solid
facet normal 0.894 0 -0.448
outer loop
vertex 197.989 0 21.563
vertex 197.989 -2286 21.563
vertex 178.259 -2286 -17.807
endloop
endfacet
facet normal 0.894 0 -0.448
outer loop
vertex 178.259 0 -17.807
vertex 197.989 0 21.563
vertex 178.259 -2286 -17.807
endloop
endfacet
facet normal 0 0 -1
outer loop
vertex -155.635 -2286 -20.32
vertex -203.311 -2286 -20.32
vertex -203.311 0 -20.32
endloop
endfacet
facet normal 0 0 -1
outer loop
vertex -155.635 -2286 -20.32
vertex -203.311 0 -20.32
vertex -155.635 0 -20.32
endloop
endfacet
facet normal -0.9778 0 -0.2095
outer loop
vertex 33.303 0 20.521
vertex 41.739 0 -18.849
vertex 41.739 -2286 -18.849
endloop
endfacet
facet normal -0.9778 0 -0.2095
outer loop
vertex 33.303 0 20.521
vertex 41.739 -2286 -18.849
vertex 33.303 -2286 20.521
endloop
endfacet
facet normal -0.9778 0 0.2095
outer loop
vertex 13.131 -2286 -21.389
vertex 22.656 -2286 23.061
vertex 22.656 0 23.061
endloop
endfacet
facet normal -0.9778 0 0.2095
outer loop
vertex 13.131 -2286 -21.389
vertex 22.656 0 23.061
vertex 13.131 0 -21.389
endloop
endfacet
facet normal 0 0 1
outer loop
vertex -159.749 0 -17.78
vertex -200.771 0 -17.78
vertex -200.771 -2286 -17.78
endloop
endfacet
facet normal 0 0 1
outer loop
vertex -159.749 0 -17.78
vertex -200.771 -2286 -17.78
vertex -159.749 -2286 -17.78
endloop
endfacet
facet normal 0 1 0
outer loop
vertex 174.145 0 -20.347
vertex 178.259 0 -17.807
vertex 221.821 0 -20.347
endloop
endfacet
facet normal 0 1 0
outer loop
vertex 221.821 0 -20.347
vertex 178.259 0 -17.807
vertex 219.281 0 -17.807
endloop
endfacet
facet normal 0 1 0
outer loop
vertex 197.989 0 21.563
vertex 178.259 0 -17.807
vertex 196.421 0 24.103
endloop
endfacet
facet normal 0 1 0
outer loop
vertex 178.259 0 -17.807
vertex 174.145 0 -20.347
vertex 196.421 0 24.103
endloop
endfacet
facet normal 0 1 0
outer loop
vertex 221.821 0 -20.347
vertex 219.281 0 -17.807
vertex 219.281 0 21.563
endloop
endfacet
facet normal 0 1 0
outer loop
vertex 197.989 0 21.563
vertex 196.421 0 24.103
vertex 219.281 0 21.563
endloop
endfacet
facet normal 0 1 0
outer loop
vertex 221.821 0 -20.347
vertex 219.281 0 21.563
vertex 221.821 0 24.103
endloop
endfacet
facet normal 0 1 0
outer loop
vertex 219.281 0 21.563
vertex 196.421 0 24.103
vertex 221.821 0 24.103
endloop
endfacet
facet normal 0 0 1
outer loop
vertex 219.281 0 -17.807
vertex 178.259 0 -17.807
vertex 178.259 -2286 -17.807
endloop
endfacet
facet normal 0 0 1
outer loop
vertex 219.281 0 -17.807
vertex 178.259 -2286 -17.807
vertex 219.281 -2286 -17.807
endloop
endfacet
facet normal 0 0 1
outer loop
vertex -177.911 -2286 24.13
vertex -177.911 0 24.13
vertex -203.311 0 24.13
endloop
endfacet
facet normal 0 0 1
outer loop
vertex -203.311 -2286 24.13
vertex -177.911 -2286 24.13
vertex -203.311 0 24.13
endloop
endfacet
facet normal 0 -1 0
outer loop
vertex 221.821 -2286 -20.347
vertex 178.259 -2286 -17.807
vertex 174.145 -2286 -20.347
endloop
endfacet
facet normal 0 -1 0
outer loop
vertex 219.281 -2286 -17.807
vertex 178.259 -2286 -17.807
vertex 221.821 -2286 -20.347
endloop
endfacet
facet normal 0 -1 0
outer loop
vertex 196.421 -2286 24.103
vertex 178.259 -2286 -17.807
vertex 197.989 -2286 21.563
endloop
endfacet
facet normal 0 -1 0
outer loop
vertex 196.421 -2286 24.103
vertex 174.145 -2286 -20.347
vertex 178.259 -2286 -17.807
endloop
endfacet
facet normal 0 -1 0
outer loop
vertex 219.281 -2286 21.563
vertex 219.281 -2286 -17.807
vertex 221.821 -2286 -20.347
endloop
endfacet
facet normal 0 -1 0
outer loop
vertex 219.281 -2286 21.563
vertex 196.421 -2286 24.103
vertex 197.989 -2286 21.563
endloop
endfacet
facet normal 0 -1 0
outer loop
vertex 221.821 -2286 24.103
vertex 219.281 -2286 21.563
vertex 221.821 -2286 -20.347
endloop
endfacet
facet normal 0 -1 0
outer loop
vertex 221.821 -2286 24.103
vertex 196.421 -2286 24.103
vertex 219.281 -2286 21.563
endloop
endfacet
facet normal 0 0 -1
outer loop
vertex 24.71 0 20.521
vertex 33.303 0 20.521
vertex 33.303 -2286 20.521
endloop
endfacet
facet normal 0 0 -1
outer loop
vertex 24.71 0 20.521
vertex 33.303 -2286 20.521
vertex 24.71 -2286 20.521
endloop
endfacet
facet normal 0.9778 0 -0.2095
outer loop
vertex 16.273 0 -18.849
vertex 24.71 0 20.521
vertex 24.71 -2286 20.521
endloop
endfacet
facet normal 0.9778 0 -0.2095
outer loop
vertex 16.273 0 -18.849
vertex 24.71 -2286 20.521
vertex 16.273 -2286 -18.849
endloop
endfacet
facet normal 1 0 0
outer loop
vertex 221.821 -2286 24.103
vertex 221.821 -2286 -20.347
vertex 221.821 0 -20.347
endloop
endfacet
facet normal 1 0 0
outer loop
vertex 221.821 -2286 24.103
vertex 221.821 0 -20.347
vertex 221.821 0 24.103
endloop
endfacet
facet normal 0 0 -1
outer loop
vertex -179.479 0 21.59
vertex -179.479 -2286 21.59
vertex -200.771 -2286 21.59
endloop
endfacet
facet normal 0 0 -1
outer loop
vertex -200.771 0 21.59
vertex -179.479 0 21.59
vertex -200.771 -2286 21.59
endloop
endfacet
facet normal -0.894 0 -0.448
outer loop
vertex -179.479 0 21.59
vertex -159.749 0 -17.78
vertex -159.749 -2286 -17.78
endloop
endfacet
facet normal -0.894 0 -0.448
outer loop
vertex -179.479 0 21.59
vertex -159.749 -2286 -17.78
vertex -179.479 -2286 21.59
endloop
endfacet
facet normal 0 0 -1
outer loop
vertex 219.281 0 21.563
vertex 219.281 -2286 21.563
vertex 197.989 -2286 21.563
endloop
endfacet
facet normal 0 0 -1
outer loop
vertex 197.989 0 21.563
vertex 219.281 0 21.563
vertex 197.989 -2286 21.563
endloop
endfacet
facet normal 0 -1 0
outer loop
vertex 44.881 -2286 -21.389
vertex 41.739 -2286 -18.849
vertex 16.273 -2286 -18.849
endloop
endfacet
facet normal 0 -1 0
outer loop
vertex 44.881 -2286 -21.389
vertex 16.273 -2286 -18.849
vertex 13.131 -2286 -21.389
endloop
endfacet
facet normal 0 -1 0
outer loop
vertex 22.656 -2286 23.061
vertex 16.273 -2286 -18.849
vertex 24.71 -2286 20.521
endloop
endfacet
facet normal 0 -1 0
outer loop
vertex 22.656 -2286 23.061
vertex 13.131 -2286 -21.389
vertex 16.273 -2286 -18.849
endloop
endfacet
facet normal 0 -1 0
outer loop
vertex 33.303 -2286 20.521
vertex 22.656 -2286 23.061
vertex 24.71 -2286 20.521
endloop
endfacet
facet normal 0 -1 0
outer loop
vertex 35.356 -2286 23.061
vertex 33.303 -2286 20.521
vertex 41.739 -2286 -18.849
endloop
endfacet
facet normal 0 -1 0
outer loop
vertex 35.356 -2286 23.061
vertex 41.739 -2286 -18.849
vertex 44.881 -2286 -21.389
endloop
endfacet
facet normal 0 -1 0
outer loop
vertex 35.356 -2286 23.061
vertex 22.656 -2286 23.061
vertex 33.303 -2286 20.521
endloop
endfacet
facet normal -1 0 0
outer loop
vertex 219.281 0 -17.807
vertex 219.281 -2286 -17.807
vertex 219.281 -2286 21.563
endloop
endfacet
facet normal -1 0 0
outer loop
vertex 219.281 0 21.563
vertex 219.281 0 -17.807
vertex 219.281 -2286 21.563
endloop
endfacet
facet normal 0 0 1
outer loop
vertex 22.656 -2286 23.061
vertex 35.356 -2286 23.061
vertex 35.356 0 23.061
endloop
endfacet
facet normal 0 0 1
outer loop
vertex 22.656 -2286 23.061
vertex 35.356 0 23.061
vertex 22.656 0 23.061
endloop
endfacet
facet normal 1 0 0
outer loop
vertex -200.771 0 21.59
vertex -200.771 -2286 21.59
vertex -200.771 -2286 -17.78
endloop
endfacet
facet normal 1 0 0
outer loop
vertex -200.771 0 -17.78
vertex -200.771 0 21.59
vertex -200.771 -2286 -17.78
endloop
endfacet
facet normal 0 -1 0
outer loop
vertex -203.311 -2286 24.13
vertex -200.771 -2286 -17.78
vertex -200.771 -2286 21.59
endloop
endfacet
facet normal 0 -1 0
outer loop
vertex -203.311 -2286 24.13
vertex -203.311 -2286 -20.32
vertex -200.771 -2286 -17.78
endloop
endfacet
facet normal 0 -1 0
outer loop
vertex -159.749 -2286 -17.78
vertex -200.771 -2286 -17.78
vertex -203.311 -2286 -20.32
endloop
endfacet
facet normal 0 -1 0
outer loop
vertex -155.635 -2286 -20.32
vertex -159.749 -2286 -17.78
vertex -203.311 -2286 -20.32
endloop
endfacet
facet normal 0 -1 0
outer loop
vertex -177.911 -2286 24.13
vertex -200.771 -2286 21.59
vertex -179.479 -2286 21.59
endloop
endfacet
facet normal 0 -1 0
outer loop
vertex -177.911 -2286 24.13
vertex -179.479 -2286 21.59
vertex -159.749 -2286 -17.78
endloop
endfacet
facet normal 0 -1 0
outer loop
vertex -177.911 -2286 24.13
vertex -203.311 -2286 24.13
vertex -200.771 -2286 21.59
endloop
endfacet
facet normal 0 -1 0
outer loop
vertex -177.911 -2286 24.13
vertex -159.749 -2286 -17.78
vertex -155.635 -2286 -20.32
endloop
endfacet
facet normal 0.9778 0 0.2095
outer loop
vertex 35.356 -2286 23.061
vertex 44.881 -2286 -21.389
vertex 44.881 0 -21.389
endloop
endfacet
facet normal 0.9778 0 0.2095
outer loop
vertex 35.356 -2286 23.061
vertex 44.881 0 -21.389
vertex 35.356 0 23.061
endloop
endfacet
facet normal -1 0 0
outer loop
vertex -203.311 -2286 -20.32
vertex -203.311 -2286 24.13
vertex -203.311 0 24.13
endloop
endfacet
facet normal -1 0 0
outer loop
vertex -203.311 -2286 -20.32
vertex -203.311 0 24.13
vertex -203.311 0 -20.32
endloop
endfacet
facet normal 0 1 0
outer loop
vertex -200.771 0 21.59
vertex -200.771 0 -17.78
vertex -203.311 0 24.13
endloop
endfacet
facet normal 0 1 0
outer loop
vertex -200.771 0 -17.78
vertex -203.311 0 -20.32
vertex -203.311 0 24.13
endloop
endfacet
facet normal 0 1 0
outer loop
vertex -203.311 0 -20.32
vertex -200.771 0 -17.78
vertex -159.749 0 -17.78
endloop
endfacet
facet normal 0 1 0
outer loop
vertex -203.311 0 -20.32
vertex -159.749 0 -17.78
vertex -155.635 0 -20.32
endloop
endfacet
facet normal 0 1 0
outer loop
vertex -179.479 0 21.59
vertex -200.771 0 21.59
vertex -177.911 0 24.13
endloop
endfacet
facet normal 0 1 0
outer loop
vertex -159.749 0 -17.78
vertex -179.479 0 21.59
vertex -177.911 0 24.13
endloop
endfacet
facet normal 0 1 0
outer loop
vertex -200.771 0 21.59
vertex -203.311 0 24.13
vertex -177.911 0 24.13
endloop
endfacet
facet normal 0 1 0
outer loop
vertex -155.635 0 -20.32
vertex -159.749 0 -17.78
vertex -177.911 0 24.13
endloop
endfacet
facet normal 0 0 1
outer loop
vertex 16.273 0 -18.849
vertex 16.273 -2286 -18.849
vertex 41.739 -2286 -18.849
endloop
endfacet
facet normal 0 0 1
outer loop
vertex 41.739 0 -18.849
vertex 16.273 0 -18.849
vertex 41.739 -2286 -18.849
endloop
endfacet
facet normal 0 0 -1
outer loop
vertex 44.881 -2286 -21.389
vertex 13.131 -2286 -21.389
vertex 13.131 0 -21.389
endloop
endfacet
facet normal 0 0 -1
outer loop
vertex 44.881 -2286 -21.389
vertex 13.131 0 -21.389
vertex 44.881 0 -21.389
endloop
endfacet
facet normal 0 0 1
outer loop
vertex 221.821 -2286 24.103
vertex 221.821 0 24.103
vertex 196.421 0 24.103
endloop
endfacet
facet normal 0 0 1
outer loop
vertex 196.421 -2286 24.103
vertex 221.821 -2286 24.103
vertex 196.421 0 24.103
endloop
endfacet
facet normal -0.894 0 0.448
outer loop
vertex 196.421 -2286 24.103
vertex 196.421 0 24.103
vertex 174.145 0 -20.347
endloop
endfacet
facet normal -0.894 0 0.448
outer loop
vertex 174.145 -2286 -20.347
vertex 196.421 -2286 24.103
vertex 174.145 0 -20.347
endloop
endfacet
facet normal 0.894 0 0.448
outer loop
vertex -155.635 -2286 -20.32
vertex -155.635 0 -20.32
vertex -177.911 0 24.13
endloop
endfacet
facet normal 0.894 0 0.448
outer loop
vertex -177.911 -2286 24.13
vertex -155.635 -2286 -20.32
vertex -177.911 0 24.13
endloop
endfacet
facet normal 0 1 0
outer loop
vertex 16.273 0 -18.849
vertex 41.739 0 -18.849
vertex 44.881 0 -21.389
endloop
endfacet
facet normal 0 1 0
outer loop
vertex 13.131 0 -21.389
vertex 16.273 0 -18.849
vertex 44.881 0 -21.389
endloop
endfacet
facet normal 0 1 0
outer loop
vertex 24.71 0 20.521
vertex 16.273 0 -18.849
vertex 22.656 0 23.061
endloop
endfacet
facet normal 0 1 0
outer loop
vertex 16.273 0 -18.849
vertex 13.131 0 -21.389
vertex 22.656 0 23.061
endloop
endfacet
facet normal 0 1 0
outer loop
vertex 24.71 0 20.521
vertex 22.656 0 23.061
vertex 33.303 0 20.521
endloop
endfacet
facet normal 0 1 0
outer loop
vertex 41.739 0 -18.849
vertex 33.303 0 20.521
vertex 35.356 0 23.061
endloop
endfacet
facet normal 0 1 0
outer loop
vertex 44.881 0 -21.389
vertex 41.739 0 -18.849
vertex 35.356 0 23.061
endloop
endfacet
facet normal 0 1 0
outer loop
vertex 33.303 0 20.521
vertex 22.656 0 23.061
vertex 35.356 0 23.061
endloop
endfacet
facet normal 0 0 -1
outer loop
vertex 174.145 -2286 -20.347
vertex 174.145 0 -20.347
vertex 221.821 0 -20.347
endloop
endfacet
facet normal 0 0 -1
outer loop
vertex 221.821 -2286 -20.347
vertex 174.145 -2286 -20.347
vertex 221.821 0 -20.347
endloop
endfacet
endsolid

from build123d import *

# Parameters (mm, degrees)
F1_DEPTH = 2286
F2_T     = -2.54
F5_DEPTH = 2286
F6_T     = -2.54
F7_DEPTH = 2286
F8_T     = -2.54


with BuildPart() as f1:
    # F0 (on Front) → F1 (new body)
    with BuildSketch(Plane.XZ):
        Polygon((-177.910953, 24.129806), (-203.310953, 24.129806), (-203.310953, -20.320194), (-177.646502, -20.320194), (-155.634962, -20.320194), align=None)
    extrude(amount=F1_DEPTH)

    # F2
    f2_openings = [f1.faces().sort_by_distance(p)[0] for p in [
        (-184.476083, -2286, -0.3535),
        (-184.476083, 0, -0.3535),
    ]]
    offset(amount=F2_T, openings=f2_openings)


with BuildPart() as f5:
    # F3 (on Front) → F5 (new body)
    with BuildSketch(Plane.XZ):
        Polygon((22.656438, 23.061386), (13.131438, -21.388614), (44.881438, -21.388614), (35.356438, 23.061386), align=None)
    extrude(amount=F5_DEPTH)

    # F6
    f6_openings = [f5.faces().sort_by_distance(p)[0] for p in [
        (29.006438, 0, -2.338614),
        (29.006438, -2286, -2.338614),
    ]]
    offset(amount=F6_T, openings=f6_openings)


with BuildPart() as f7:
    # F4 (on Front) → F7 (new body)
    with BuildSketch(Plane.XZ):
        Polygon((221.82103, -20.347234), (221.82103, 24.102766), (196.42103, 24.102766), (174.145039, -20.347234), align=None)
    extrude(amount=F7_DEPTH)

    # F8
    f8_openings = [f7.faces().sort_by_distance(p)[0] for p in [
        (202.98616, -2286, -0.380541),
        (202.98616, 0, -0.380541),
    ]]
    offset(amount=F8_T, openings=f8_openings)


solid = Compound([f1.part, f5.part, f7.part])
